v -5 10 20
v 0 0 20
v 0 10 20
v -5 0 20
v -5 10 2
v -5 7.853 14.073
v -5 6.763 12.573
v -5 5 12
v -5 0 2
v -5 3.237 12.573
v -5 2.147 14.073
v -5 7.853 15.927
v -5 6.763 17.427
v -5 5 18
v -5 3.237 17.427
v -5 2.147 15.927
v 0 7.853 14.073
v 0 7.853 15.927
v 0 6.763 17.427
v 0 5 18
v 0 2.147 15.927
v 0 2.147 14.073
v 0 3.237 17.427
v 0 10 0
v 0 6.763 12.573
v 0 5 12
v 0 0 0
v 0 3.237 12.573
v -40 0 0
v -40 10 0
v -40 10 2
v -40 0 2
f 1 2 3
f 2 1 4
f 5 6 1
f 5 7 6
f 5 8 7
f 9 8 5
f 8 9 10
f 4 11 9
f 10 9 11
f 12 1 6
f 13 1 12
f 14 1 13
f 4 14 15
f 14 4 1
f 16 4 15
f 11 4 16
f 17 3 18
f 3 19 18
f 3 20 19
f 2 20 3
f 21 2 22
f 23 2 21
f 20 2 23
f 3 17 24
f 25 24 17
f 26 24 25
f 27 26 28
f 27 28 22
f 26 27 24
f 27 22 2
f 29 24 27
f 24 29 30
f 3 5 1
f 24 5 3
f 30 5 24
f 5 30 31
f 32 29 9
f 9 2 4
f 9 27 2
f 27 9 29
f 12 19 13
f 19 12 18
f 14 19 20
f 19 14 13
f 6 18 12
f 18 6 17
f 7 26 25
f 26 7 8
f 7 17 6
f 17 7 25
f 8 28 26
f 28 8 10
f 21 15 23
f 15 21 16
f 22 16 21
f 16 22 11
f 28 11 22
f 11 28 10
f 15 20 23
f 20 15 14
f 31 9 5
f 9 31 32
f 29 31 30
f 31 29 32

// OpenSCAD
rotate([0,-90,0]) {
	difference() {
		cube([20,10,5]);
		translate([15, 5, 0]) {cylinder(5, r=3);}
	}

	cube([2, 10, 40]);
}
